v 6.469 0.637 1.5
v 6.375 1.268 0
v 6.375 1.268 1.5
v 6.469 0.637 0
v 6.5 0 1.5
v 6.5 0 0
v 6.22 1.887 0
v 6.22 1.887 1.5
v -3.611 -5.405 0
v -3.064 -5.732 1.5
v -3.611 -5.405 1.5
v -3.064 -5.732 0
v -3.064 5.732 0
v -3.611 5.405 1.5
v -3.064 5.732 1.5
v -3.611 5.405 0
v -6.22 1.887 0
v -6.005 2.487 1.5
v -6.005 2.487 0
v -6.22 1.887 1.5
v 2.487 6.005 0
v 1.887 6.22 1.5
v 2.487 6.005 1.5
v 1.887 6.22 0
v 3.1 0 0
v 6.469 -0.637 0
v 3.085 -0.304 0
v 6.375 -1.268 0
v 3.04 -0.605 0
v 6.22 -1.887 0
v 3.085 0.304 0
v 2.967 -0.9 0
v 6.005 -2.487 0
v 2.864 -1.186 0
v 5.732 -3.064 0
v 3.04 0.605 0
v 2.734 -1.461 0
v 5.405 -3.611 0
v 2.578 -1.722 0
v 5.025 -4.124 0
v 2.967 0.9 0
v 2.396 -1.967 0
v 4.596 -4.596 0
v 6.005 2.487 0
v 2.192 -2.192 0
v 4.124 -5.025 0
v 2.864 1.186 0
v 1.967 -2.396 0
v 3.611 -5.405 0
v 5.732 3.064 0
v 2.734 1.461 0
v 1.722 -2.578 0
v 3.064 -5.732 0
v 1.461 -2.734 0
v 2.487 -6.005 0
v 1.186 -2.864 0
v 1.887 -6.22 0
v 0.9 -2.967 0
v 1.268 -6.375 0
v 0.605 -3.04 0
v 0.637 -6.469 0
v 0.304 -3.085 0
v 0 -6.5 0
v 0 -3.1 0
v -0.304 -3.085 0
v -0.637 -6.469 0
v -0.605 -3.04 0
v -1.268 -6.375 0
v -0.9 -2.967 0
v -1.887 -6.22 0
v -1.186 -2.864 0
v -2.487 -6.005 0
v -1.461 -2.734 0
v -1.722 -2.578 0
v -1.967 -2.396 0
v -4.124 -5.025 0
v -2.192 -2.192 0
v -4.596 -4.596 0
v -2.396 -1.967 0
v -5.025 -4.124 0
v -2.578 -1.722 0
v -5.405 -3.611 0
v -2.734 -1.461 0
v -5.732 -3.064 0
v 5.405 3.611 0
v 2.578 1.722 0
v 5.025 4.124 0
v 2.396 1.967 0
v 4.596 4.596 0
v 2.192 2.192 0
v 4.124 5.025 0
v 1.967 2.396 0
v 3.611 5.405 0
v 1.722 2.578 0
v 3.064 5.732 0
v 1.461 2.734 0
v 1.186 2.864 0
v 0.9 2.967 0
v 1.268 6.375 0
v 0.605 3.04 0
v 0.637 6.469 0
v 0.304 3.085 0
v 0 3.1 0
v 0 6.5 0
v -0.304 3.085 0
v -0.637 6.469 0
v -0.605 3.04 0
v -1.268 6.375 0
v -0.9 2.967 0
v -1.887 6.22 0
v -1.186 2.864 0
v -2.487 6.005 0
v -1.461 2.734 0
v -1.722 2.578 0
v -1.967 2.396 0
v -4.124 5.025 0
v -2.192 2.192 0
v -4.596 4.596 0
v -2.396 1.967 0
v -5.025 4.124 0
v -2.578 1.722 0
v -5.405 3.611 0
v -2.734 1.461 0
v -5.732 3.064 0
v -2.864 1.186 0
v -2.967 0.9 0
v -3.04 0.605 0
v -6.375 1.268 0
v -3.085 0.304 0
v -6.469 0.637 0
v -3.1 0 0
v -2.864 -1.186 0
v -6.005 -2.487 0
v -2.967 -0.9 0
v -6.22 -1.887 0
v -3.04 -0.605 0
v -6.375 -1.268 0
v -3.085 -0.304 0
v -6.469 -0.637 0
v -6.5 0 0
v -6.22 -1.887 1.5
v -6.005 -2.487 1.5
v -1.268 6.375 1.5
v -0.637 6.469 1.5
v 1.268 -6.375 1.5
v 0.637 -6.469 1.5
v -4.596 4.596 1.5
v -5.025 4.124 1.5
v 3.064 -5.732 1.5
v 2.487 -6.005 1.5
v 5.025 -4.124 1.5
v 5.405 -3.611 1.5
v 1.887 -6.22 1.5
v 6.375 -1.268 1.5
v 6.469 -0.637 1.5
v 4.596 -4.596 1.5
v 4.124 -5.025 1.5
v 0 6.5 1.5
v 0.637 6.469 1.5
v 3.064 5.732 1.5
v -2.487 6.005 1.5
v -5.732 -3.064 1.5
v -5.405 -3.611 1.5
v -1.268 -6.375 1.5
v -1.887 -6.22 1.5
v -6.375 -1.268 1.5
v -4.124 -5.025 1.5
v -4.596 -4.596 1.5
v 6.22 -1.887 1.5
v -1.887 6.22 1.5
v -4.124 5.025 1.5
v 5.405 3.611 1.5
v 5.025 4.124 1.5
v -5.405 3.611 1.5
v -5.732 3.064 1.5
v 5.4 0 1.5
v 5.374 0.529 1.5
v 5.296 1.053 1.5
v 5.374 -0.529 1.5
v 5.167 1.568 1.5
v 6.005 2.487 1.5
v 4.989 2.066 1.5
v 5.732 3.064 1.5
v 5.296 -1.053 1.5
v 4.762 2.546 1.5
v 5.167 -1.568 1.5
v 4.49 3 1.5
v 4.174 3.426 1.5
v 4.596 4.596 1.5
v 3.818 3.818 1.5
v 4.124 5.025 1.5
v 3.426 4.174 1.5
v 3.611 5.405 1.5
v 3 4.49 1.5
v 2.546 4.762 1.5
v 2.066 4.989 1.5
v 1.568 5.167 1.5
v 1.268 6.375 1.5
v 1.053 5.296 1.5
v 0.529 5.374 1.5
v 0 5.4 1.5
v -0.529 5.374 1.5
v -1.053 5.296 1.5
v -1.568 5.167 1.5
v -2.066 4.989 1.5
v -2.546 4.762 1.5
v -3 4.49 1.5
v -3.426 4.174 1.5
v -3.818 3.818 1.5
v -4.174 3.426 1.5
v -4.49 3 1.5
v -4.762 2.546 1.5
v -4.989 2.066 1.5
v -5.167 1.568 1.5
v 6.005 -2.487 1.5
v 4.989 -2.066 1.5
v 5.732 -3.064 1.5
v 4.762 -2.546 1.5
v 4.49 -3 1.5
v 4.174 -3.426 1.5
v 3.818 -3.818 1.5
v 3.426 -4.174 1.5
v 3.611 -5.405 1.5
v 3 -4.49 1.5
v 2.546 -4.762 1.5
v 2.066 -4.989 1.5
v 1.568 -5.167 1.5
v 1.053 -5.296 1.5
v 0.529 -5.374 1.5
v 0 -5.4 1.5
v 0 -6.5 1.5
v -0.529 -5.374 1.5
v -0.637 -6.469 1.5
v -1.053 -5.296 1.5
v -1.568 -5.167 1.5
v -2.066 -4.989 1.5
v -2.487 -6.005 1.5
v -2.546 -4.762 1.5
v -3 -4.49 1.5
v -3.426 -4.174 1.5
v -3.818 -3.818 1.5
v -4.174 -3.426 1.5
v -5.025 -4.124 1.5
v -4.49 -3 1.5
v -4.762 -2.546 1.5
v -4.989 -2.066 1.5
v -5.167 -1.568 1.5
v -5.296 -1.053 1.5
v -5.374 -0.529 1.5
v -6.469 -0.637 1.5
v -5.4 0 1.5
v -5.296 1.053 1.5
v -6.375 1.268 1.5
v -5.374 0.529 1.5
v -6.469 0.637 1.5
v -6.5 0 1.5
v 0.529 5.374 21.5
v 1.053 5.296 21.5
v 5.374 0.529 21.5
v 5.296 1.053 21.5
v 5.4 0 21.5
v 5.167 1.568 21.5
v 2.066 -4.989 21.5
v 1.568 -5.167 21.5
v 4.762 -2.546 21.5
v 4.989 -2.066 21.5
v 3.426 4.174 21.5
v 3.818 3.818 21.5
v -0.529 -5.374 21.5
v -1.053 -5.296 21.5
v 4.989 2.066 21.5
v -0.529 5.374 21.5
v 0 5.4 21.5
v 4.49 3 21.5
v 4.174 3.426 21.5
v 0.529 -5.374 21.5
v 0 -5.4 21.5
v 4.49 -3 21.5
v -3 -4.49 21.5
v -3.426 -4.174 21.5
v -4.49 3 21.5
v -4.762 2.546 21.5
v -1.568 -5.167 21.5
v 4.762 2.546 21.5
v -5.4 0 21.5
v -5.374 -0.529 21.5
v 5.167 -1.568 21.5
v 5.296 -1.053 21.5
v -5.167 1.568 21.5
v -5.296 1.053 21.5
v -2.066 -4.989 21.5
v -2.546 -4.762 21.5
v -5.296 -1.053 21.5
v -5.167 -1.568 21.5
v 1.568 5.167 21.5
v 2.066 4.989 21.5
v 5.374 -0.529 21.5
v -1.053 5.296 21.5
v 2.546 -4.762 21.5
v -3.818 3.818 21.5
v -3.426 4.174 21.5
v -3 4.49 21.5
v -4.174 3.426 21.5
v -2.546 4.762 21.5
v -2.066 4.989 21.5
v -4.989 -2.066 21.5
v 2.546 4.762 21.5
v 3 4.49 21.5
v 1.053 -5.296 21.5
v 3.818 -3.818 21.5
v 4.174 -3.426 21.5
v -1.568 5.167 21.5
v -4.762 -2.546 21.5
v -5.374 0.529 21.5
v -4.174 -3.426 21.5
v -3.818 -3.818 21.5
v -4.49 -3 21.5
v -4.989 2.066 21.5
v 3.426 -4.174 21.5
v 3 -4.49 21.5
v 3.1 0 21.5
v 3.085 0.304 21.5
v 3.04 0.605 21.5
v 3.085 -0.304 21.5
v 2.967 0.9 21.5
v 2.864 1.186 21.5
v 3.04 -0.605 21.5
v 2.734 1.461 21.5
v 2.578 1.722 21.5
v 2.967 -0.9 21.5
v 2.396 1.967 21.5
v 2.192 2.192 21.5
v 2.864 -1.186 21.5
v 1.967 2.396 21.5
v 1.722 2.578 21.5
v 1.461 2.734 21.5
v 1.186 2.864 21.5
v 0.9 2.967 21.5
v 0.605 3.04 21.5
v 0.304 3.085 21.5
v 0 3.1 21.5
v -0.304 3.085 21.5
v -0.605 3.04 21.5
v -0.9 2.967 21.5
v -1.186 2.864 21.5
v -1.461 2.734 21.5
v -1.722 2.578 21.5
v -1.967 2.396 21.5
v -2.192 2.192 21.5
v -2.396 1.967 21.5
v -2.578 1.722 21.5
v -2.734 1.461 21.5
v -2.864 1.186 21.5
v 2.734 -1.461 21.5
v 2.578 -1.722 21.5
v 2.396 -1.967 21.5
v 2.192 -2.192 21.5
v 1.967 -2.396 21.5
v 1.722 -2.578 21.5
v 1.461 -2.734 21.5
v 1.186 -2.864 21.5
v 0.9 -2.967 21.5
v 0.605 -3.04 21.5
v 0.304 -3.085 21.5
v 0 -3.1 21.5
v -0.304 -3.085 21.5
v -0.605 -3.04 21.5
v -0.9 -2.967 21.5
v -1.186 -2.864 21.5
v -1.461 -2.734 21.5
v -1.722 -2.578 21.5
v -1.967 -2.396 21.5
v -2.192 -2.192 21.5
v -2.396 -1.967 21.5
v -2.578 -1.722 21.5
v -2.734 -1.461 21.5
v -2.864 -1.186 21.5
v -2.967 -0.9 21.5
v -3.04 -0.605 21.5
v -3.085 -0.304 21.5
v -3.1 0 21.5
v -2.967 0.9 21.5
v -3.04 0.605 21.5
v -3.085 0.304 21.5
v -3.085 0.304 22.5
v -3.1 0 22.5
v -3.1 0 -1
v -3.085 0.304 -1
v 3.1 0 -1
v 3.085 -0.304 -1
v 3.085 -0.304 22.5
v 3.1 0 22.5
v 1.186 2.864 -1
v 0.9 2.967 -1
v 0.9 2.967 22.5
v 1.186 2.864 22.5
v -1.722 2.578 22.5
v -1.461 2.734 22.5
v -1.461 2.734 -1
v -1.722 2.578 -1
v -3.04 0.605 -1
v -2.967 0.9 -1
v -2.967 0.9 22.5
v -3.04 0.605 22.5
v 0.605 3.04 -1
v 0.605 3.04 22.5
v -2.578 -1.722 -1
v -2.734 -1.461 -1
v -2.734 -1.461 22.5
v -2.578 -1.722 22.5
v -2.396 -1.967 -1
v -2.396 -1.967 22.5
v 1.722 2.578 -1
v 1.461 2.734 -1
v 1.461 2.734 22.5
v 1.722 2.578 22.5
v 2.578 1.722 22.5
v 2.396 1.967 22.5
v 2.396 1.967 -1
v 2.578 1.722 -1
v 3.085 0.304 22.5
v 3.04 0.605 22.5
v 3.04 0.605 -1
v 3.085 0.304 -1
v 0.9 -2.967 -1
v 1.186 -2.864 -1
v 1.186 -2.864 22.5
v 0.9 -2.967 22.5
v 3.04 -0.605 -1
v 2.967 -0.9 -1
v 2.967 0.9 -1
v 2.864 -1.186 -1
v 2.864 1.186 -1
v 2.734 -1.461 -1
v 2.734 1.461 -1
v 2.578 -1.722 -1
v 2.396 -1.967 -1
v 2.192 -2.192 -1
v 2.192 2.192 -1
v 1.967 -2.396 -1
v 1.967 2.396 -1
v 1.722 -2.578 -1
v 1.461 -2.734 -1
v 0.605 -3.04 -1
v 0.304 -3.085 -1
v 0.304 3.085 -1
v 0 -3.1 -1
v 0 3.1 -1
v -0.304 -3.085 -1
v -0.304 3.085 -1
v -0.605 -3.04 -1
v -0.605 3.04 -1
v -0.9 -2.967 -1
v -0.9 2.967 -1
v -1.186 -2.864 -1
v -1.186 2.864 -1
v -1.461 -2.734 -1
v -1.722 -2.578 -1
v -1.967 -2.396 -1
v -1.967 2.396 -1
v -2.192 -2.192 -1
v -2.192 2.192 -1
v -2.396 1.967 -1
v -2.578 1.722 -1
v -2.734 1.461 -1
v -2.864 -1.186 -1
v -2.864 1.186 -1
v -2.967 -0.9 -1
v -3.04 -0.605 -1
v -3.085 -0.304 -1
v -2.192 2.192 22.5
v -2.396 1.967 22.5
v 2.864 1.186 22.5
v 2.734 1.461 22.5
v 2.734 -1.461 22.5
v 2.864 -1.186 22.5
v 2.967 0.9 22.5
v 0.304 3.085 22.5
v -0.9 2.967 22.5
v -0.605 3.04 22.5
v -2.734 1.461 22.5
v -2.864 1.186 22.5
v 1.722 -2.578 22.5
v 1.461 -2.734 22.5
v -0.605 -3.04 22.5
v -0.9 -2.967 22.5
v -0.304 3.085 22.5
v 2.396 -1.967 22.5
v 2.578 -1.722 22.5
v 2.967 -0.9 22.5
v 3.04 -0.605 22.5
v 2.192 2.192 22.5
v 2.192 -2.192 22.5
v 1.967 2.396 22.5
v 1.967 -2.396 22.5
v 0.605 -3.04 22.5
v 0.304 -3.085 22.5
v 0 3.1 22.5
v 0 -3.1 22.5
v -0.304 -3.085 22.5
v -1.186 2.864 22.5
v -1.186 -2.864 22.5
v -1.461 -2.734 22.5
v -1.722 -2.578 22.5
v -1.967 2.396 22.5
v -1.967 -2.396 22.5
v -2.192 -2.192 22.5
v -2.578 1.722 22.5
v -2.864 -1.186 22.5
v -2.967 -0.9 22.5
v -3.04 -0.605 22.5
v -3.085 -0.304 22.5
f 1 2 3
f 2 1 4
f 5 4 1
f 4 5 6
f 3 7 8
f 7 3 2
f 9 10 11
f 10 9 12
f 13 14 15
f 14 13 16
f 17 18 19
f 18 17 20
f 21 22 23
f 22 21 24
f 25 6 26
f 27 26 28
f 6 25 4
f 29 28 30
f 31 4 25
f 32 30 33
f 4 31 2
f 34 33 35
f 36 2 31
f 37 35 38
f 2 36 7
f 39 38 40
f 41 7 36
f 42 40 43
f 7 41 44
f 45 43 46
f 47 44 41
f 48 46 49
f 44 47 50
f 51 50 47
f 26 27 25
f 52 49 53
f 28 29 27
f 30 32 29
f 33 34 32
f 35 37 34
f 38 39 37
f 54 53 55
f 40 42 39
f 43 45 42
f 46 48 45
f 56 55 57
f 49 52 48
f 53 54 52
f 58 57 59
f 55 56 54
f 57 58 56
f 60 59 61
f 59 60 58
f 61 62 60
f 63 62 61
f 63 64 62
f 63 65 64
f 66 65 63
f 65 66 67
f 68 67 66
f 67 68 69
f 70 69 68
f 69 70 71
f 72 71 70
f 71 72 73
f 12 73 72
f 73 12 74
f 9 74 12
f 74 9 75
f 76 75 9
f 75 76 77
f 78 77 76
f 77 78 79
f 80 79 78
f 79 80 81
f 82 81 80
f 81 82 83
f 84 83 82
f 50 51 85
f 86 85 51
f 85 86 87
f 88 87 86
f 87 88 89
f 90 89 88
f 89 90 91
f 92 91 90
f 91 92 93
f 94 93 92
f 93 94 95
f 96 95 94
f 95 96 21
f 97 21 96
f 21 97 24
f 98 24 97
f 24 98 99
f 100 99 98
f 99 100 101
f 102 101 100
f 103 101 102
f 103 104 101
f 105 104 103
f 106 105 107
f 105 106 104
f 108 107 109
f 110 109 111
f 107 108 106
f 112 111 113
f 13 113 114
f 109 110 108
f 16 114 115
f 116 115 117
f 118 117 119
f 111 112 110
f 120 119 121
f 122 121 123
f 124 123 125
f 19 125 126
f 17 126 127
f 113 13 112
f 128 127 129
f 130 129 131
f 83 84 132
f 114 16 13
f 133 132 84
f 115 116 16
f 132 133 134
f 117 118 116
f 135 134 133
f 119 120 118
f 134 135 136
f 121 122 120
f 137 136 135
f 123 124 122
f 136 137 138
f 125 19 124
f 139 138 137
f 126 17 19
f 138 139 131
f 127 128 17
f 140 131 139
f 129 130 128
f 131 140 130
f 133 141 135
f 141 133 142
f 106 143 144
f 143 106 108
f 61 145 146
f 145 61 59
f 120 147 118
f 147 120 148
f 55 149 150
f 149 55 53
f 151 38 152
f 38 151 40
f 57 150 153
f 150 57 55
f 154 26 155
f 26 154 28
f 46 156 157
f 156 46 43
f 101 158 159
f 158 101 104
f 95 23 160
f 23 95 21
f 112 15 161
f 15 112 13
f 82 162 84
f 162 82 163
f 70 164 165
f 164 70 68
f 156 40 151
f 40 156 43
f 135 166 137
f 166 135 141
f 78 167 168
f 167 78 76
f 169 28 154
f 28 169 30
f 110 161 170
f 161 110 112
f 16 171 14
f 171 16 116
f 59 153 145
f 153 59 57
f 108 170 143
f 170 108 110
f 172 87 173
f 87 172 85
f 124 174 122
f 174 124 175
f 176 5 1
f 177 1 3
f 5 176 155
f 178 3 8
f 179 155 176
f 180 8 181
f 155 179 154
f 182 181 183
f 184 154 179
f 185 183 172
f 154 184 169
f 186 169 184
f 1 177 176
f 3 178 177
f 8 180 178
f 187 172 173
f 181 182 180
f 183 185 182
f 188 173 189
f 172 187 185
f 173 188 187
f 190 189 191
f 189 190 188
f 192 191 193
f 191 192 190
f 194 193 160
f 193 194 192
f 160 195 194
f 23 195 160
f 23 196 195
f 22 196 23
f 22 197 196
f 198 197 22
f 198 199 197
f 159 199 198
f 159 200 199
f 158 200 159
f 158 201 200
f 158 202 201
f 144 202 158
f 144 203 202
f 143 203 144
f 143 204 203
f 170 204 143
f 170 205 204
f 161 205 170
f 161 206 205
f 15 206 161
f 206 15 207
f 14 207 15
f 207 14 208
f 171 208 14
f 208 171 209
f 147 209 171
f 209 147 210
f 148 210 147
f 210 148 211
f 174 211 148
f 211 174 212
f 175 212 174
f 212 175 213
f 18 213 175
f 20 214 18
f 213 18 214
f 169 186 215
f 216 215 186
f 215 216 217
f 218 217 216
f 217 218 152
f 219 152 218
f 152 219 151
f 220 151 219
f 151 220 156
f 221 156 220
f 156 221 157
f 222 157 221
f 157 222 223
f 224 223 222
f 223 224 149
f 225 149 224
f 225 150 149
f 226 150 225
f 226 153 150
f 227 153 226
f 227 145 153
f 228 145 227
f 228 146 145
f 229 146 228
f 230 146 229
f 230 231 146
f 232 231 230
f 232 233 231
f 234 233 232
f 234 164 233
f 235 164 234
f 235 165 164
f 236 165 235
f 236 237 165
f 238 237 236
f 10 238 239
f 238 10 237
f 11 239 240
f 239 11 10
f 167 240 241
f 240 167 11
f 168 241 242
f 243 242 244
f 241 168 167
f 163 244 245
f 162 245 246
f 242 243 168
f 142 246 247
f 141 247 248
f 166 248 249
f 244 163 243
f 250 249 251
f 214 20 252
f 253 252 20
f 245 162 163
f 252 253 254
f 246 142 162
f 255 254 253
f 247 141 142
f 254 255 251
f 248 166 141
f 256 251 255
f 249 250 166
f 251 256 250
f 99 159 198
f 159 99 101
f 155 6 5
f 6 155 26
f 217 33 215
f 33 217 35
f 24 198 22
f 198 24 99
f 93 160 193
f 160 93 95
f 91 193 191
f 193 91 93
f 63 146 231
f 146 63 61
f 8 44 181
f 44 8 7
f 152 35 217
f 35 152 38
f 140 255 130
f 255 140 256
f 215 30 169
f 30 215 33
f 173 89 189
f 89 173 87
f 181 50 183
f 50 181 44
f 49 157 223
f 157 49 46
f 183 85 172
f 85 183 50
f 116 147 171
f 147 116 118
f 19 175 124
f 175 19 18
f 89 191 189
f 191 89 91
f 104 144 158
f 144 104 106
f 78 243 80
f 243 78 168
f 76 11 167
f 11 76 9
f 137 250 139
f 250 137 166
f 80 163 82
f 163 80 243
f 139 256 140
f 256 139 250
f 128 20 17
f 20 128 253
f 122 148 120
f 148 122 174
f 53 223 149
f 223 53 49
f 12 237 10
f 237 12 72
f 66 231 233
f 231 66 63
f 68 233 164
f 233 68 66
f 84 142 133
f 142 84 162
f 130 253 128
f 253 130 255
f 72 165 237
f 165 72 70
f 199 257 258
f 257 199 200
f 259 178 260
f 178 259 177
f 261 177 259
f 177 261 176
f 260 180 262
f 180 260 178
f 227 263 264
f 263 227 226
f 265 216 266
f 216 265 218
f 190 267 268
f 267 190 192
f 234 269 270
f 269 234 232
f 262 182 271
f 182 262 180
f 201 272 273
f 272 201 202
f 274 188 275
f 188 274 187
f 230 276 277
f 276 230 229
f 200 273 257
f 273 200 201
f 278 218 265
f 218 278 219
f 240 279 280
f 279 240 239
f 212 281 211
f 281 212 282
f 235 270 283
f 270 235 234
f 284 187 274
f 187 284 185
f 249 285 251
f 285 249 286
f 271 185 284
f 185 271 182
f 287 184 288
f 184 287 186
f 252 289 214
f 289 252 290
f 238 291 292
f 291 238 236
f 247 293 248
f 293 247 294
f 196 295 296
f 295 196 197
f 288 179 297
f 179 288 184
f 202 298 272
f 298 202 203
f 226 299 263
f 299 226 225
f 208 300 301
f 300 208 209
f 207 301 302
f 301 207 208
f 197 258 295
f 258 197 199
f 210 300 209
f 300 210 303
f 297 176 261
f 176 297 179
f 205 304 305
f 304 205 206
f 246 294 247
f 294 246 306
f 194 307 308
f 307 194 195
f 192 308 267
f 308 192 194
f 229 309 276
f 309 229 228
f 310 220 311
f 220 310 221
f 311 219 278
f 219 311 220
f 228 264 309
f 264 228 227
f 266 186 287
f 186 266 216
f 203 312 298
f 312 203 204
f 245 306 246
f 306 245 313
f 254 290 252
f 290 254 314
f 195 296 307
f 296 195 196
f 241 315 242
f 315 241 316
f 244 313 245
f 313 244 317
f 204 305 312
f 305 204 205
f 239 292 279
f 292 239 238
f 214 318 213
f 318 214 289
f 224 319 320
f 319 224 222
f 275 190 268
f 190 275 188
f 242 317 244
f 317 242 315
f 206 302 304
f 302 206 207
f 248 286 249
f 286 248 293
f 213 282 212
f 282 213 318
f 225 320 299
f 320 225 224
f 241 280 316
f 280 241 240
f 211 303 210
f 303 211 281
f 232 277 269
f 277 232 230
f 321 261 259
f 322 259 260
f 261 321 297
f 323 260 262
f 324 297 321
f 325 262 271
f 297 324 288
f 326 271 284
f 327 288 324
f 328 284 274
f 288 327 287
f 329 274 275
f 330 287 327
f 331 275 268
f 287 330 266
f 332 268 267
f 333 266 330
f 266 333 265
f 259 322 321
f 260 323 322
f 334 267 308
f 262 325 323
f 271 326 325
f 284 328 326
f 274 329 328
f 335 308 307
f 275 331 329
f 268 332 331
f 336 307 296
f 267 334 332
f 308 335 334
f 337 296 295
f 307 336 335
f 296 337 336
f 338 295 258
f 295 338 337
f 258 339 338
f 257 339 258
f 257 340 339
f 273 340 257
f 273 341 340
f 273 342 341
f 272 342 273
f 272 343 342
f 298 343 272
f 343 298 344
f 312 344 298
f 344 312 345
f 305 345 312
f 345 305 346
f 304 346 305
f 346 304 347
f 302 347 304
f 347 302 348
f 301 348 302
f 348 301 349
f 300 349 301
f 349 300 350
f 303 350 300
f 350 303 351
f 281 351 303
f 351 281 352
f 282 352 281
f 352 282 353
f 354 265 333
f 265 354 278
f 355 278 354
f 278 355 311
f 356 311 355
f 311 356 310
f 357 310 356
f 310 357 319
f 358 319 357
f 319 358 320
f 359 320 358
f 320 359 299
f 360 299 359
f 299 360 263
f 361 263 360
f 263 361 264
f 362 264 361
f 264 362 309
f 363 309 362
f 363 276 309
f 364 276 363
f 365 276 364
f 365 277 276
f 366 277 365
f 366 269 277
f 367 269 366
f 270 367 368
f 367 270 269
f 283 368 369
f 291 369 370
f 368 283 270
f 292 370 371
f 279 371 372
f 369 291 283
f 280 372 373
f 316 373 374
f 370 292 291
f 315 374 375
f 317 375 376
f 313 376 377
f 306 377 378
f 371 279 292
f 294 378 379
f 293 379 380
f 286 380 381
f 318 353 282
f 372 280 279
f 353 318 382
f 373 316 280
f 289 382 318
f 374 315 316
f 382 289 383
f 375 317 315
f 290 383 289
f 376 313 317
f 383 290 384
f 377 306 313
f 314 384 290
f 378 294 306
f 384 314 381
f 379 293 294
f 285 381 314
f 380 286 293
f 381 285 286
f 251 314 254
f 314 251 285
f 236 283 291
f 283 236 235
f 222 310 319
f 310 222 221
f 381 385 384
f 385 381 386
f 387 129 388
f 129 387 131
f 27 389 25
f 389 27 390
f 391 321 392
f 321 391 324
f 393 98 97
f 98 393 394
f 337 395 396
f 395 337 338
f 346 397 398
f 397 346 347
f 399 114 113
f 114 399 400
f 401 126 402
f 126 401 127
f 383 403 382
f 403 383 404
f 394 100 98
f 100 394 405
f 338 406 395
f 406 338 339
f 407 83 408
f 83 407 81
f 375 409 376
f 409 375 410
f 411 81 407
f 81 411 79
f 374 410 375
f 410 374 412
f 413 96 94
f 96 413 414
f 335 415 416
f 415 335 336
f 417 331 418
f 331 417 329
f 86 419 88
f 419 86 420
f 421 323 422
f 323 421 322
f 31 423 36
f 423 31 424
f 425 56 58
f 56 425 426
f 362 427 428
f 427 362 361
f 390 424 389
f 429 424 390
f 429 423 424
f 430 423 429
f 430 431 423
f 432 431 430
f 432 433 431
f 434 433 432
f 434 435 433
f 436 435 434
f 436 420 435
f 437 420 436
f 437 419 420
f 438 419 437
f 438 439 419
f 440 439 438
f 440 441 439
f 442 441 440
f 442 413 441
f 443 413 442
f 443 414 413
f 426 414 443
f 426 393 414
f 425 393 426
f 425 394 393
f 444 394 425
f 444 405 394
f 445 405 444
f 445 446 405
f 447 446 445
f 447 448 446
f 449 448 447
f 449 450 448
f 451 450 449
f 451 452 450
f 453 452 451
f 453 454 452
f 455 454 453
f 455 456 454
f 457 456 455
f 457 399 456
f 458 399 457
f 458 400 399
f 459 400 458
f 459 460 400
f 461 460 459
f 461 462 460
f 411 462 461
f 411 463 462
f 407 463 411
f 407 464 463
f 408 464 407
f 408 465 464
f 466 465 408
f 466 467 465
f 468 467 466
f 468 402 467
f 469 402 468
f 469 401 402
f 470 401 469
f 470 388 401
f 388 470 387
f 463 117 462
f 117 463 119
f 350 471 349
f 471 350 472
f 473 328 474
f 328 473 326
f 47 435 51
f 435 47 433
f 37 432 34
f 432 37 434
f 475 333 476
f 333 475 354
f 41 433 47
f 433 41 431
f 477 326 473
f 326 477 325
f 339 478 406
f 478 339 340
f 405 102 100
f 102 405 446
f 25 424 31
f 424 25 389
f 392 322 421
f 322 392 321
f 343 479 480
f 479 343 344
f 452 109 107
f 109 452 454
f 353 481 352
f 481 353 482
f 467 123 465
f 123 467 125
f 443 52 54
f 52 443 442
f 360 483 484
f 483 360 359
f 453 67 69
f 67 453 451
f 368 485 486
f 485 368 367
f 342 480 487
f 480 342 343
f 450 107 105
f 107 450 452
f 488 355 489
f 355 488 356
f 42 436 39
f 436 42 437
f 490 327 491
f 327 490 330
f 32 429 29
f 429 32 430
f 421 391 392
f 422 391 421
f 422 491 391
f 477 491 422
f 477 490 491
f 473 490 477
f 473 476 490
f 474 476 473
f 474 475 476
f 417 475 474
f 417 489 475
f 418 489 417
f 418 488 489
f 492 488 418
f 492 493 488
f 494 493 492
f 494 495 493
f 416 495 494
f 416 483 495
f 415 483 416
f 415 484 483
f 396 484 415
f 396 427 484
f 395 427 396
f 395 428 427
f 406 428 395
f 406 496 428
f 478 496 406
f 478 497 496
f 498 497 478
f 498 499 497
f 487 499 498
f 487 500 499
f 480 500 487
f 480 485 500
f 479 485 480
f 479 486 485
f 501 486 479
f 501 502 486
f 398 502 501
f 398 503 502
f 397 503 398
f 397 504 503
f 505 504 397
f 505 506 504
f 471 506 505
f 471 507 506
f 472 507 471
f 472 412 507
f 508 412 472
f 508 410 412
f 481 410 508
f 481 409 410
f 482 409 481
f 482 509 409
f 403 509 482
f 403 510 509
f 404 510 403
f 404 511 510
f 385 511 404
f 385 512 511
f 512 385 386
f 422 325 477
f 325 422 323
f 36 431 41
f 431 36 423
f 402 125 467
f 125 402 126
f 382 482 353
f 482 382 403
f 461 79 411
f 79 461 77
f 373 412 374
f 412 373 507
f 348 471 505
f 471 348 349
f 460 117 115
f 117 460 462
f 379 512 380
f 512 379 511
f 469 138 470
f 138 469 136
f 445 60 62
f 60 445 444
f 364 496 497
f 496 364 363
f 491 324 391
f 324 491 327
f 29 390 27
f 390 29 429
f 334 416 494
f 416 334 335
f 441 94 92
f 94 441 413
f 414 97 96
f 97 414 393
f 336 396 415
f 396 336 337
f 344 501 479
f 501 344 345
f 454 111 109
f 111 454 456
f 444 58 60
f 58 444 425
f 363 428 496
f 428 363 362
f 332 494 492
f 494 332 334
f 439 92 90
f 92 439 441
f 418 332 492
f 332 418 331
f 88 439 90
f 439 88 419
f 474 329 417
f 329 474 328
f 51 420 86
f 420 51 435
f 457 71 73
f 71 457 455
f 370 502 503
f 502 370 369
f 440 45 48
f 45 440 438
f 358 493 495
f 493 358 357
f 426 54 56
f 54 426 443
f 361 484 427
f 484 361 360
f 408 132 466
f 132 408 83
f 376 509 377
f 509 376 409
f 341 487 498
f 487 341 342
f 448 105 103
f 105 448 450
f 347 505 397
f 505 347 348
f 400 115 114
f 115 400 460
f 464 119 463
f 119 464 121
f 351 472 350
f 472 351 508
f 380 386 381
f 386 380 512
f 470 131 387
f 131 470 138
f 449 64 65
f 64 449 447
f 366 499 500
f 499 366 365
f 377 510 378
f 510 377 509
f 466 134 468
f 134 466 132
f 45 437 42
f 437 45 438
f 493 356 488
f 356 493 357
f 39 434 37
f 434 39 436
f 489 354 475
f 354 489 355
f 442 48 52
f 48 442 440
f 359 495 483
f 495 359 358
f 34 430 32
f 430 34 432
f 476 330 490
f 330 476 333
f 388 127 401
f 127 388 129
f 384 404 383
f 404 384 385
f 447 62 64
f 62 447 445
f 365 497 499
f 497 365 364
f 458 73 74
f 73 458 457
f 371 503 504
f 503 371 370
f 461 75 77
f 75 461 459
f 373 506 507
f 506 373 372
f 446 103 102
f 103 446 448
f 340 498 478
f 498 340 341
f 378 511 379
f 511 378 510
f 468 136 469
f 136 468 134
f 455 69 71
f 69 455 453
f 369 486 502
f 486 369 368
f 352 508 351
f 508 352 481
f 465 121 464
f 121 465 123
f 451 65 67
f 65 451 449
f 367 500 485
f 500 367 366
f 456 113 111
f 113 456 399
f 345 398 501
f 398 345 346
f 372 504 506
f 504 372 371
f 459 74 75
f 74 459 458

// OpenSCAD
// Adapter sleeve: 0.2 mL PCR tube into 1.5 mL tube rack hole
// Dimensions measured with calipers

// Collar (lies on bed, z=0 to 1.5)
collar_dia = 13;
collar_thick = 1.5;

// Sleeve body (rises from collar to z=21.5)
sleeve_od = 10.8;
sleeve_height = 21.5;

// Bore (straight through full height, open both ends)
bore_dia = 6.2;

// Resolution for curved shapes
$fn = 64;

// Build the part in print orientation: collar on bed, sleeve rising up
union() {
    // Collar: cylinder on the bed
    translate([0, 0, 0])
        cylinder(h = collar_thick, r = collar_dia / 2, center = false);

    // Sleeve body: starts at top of collar (z = collar_thick)
    translate([0, 0, collar_thick])
        cylinder(h = sleeve_height - collar_thick, r = sleeve_od / 2, center = false);
}

// Subtract the bore: extends slightly past top and bottom to avoid coplanar faces
difference() {
    // (The union above is implicitly the first operand of difference)
    // Bore hole: extends 1 mm below z=0 and 1 mm above z=sleeve_height
    translate([0, 0, -1])
        cylinder(h = sleeve_height + 2, r = bore_dia / 2, center = false);
}
